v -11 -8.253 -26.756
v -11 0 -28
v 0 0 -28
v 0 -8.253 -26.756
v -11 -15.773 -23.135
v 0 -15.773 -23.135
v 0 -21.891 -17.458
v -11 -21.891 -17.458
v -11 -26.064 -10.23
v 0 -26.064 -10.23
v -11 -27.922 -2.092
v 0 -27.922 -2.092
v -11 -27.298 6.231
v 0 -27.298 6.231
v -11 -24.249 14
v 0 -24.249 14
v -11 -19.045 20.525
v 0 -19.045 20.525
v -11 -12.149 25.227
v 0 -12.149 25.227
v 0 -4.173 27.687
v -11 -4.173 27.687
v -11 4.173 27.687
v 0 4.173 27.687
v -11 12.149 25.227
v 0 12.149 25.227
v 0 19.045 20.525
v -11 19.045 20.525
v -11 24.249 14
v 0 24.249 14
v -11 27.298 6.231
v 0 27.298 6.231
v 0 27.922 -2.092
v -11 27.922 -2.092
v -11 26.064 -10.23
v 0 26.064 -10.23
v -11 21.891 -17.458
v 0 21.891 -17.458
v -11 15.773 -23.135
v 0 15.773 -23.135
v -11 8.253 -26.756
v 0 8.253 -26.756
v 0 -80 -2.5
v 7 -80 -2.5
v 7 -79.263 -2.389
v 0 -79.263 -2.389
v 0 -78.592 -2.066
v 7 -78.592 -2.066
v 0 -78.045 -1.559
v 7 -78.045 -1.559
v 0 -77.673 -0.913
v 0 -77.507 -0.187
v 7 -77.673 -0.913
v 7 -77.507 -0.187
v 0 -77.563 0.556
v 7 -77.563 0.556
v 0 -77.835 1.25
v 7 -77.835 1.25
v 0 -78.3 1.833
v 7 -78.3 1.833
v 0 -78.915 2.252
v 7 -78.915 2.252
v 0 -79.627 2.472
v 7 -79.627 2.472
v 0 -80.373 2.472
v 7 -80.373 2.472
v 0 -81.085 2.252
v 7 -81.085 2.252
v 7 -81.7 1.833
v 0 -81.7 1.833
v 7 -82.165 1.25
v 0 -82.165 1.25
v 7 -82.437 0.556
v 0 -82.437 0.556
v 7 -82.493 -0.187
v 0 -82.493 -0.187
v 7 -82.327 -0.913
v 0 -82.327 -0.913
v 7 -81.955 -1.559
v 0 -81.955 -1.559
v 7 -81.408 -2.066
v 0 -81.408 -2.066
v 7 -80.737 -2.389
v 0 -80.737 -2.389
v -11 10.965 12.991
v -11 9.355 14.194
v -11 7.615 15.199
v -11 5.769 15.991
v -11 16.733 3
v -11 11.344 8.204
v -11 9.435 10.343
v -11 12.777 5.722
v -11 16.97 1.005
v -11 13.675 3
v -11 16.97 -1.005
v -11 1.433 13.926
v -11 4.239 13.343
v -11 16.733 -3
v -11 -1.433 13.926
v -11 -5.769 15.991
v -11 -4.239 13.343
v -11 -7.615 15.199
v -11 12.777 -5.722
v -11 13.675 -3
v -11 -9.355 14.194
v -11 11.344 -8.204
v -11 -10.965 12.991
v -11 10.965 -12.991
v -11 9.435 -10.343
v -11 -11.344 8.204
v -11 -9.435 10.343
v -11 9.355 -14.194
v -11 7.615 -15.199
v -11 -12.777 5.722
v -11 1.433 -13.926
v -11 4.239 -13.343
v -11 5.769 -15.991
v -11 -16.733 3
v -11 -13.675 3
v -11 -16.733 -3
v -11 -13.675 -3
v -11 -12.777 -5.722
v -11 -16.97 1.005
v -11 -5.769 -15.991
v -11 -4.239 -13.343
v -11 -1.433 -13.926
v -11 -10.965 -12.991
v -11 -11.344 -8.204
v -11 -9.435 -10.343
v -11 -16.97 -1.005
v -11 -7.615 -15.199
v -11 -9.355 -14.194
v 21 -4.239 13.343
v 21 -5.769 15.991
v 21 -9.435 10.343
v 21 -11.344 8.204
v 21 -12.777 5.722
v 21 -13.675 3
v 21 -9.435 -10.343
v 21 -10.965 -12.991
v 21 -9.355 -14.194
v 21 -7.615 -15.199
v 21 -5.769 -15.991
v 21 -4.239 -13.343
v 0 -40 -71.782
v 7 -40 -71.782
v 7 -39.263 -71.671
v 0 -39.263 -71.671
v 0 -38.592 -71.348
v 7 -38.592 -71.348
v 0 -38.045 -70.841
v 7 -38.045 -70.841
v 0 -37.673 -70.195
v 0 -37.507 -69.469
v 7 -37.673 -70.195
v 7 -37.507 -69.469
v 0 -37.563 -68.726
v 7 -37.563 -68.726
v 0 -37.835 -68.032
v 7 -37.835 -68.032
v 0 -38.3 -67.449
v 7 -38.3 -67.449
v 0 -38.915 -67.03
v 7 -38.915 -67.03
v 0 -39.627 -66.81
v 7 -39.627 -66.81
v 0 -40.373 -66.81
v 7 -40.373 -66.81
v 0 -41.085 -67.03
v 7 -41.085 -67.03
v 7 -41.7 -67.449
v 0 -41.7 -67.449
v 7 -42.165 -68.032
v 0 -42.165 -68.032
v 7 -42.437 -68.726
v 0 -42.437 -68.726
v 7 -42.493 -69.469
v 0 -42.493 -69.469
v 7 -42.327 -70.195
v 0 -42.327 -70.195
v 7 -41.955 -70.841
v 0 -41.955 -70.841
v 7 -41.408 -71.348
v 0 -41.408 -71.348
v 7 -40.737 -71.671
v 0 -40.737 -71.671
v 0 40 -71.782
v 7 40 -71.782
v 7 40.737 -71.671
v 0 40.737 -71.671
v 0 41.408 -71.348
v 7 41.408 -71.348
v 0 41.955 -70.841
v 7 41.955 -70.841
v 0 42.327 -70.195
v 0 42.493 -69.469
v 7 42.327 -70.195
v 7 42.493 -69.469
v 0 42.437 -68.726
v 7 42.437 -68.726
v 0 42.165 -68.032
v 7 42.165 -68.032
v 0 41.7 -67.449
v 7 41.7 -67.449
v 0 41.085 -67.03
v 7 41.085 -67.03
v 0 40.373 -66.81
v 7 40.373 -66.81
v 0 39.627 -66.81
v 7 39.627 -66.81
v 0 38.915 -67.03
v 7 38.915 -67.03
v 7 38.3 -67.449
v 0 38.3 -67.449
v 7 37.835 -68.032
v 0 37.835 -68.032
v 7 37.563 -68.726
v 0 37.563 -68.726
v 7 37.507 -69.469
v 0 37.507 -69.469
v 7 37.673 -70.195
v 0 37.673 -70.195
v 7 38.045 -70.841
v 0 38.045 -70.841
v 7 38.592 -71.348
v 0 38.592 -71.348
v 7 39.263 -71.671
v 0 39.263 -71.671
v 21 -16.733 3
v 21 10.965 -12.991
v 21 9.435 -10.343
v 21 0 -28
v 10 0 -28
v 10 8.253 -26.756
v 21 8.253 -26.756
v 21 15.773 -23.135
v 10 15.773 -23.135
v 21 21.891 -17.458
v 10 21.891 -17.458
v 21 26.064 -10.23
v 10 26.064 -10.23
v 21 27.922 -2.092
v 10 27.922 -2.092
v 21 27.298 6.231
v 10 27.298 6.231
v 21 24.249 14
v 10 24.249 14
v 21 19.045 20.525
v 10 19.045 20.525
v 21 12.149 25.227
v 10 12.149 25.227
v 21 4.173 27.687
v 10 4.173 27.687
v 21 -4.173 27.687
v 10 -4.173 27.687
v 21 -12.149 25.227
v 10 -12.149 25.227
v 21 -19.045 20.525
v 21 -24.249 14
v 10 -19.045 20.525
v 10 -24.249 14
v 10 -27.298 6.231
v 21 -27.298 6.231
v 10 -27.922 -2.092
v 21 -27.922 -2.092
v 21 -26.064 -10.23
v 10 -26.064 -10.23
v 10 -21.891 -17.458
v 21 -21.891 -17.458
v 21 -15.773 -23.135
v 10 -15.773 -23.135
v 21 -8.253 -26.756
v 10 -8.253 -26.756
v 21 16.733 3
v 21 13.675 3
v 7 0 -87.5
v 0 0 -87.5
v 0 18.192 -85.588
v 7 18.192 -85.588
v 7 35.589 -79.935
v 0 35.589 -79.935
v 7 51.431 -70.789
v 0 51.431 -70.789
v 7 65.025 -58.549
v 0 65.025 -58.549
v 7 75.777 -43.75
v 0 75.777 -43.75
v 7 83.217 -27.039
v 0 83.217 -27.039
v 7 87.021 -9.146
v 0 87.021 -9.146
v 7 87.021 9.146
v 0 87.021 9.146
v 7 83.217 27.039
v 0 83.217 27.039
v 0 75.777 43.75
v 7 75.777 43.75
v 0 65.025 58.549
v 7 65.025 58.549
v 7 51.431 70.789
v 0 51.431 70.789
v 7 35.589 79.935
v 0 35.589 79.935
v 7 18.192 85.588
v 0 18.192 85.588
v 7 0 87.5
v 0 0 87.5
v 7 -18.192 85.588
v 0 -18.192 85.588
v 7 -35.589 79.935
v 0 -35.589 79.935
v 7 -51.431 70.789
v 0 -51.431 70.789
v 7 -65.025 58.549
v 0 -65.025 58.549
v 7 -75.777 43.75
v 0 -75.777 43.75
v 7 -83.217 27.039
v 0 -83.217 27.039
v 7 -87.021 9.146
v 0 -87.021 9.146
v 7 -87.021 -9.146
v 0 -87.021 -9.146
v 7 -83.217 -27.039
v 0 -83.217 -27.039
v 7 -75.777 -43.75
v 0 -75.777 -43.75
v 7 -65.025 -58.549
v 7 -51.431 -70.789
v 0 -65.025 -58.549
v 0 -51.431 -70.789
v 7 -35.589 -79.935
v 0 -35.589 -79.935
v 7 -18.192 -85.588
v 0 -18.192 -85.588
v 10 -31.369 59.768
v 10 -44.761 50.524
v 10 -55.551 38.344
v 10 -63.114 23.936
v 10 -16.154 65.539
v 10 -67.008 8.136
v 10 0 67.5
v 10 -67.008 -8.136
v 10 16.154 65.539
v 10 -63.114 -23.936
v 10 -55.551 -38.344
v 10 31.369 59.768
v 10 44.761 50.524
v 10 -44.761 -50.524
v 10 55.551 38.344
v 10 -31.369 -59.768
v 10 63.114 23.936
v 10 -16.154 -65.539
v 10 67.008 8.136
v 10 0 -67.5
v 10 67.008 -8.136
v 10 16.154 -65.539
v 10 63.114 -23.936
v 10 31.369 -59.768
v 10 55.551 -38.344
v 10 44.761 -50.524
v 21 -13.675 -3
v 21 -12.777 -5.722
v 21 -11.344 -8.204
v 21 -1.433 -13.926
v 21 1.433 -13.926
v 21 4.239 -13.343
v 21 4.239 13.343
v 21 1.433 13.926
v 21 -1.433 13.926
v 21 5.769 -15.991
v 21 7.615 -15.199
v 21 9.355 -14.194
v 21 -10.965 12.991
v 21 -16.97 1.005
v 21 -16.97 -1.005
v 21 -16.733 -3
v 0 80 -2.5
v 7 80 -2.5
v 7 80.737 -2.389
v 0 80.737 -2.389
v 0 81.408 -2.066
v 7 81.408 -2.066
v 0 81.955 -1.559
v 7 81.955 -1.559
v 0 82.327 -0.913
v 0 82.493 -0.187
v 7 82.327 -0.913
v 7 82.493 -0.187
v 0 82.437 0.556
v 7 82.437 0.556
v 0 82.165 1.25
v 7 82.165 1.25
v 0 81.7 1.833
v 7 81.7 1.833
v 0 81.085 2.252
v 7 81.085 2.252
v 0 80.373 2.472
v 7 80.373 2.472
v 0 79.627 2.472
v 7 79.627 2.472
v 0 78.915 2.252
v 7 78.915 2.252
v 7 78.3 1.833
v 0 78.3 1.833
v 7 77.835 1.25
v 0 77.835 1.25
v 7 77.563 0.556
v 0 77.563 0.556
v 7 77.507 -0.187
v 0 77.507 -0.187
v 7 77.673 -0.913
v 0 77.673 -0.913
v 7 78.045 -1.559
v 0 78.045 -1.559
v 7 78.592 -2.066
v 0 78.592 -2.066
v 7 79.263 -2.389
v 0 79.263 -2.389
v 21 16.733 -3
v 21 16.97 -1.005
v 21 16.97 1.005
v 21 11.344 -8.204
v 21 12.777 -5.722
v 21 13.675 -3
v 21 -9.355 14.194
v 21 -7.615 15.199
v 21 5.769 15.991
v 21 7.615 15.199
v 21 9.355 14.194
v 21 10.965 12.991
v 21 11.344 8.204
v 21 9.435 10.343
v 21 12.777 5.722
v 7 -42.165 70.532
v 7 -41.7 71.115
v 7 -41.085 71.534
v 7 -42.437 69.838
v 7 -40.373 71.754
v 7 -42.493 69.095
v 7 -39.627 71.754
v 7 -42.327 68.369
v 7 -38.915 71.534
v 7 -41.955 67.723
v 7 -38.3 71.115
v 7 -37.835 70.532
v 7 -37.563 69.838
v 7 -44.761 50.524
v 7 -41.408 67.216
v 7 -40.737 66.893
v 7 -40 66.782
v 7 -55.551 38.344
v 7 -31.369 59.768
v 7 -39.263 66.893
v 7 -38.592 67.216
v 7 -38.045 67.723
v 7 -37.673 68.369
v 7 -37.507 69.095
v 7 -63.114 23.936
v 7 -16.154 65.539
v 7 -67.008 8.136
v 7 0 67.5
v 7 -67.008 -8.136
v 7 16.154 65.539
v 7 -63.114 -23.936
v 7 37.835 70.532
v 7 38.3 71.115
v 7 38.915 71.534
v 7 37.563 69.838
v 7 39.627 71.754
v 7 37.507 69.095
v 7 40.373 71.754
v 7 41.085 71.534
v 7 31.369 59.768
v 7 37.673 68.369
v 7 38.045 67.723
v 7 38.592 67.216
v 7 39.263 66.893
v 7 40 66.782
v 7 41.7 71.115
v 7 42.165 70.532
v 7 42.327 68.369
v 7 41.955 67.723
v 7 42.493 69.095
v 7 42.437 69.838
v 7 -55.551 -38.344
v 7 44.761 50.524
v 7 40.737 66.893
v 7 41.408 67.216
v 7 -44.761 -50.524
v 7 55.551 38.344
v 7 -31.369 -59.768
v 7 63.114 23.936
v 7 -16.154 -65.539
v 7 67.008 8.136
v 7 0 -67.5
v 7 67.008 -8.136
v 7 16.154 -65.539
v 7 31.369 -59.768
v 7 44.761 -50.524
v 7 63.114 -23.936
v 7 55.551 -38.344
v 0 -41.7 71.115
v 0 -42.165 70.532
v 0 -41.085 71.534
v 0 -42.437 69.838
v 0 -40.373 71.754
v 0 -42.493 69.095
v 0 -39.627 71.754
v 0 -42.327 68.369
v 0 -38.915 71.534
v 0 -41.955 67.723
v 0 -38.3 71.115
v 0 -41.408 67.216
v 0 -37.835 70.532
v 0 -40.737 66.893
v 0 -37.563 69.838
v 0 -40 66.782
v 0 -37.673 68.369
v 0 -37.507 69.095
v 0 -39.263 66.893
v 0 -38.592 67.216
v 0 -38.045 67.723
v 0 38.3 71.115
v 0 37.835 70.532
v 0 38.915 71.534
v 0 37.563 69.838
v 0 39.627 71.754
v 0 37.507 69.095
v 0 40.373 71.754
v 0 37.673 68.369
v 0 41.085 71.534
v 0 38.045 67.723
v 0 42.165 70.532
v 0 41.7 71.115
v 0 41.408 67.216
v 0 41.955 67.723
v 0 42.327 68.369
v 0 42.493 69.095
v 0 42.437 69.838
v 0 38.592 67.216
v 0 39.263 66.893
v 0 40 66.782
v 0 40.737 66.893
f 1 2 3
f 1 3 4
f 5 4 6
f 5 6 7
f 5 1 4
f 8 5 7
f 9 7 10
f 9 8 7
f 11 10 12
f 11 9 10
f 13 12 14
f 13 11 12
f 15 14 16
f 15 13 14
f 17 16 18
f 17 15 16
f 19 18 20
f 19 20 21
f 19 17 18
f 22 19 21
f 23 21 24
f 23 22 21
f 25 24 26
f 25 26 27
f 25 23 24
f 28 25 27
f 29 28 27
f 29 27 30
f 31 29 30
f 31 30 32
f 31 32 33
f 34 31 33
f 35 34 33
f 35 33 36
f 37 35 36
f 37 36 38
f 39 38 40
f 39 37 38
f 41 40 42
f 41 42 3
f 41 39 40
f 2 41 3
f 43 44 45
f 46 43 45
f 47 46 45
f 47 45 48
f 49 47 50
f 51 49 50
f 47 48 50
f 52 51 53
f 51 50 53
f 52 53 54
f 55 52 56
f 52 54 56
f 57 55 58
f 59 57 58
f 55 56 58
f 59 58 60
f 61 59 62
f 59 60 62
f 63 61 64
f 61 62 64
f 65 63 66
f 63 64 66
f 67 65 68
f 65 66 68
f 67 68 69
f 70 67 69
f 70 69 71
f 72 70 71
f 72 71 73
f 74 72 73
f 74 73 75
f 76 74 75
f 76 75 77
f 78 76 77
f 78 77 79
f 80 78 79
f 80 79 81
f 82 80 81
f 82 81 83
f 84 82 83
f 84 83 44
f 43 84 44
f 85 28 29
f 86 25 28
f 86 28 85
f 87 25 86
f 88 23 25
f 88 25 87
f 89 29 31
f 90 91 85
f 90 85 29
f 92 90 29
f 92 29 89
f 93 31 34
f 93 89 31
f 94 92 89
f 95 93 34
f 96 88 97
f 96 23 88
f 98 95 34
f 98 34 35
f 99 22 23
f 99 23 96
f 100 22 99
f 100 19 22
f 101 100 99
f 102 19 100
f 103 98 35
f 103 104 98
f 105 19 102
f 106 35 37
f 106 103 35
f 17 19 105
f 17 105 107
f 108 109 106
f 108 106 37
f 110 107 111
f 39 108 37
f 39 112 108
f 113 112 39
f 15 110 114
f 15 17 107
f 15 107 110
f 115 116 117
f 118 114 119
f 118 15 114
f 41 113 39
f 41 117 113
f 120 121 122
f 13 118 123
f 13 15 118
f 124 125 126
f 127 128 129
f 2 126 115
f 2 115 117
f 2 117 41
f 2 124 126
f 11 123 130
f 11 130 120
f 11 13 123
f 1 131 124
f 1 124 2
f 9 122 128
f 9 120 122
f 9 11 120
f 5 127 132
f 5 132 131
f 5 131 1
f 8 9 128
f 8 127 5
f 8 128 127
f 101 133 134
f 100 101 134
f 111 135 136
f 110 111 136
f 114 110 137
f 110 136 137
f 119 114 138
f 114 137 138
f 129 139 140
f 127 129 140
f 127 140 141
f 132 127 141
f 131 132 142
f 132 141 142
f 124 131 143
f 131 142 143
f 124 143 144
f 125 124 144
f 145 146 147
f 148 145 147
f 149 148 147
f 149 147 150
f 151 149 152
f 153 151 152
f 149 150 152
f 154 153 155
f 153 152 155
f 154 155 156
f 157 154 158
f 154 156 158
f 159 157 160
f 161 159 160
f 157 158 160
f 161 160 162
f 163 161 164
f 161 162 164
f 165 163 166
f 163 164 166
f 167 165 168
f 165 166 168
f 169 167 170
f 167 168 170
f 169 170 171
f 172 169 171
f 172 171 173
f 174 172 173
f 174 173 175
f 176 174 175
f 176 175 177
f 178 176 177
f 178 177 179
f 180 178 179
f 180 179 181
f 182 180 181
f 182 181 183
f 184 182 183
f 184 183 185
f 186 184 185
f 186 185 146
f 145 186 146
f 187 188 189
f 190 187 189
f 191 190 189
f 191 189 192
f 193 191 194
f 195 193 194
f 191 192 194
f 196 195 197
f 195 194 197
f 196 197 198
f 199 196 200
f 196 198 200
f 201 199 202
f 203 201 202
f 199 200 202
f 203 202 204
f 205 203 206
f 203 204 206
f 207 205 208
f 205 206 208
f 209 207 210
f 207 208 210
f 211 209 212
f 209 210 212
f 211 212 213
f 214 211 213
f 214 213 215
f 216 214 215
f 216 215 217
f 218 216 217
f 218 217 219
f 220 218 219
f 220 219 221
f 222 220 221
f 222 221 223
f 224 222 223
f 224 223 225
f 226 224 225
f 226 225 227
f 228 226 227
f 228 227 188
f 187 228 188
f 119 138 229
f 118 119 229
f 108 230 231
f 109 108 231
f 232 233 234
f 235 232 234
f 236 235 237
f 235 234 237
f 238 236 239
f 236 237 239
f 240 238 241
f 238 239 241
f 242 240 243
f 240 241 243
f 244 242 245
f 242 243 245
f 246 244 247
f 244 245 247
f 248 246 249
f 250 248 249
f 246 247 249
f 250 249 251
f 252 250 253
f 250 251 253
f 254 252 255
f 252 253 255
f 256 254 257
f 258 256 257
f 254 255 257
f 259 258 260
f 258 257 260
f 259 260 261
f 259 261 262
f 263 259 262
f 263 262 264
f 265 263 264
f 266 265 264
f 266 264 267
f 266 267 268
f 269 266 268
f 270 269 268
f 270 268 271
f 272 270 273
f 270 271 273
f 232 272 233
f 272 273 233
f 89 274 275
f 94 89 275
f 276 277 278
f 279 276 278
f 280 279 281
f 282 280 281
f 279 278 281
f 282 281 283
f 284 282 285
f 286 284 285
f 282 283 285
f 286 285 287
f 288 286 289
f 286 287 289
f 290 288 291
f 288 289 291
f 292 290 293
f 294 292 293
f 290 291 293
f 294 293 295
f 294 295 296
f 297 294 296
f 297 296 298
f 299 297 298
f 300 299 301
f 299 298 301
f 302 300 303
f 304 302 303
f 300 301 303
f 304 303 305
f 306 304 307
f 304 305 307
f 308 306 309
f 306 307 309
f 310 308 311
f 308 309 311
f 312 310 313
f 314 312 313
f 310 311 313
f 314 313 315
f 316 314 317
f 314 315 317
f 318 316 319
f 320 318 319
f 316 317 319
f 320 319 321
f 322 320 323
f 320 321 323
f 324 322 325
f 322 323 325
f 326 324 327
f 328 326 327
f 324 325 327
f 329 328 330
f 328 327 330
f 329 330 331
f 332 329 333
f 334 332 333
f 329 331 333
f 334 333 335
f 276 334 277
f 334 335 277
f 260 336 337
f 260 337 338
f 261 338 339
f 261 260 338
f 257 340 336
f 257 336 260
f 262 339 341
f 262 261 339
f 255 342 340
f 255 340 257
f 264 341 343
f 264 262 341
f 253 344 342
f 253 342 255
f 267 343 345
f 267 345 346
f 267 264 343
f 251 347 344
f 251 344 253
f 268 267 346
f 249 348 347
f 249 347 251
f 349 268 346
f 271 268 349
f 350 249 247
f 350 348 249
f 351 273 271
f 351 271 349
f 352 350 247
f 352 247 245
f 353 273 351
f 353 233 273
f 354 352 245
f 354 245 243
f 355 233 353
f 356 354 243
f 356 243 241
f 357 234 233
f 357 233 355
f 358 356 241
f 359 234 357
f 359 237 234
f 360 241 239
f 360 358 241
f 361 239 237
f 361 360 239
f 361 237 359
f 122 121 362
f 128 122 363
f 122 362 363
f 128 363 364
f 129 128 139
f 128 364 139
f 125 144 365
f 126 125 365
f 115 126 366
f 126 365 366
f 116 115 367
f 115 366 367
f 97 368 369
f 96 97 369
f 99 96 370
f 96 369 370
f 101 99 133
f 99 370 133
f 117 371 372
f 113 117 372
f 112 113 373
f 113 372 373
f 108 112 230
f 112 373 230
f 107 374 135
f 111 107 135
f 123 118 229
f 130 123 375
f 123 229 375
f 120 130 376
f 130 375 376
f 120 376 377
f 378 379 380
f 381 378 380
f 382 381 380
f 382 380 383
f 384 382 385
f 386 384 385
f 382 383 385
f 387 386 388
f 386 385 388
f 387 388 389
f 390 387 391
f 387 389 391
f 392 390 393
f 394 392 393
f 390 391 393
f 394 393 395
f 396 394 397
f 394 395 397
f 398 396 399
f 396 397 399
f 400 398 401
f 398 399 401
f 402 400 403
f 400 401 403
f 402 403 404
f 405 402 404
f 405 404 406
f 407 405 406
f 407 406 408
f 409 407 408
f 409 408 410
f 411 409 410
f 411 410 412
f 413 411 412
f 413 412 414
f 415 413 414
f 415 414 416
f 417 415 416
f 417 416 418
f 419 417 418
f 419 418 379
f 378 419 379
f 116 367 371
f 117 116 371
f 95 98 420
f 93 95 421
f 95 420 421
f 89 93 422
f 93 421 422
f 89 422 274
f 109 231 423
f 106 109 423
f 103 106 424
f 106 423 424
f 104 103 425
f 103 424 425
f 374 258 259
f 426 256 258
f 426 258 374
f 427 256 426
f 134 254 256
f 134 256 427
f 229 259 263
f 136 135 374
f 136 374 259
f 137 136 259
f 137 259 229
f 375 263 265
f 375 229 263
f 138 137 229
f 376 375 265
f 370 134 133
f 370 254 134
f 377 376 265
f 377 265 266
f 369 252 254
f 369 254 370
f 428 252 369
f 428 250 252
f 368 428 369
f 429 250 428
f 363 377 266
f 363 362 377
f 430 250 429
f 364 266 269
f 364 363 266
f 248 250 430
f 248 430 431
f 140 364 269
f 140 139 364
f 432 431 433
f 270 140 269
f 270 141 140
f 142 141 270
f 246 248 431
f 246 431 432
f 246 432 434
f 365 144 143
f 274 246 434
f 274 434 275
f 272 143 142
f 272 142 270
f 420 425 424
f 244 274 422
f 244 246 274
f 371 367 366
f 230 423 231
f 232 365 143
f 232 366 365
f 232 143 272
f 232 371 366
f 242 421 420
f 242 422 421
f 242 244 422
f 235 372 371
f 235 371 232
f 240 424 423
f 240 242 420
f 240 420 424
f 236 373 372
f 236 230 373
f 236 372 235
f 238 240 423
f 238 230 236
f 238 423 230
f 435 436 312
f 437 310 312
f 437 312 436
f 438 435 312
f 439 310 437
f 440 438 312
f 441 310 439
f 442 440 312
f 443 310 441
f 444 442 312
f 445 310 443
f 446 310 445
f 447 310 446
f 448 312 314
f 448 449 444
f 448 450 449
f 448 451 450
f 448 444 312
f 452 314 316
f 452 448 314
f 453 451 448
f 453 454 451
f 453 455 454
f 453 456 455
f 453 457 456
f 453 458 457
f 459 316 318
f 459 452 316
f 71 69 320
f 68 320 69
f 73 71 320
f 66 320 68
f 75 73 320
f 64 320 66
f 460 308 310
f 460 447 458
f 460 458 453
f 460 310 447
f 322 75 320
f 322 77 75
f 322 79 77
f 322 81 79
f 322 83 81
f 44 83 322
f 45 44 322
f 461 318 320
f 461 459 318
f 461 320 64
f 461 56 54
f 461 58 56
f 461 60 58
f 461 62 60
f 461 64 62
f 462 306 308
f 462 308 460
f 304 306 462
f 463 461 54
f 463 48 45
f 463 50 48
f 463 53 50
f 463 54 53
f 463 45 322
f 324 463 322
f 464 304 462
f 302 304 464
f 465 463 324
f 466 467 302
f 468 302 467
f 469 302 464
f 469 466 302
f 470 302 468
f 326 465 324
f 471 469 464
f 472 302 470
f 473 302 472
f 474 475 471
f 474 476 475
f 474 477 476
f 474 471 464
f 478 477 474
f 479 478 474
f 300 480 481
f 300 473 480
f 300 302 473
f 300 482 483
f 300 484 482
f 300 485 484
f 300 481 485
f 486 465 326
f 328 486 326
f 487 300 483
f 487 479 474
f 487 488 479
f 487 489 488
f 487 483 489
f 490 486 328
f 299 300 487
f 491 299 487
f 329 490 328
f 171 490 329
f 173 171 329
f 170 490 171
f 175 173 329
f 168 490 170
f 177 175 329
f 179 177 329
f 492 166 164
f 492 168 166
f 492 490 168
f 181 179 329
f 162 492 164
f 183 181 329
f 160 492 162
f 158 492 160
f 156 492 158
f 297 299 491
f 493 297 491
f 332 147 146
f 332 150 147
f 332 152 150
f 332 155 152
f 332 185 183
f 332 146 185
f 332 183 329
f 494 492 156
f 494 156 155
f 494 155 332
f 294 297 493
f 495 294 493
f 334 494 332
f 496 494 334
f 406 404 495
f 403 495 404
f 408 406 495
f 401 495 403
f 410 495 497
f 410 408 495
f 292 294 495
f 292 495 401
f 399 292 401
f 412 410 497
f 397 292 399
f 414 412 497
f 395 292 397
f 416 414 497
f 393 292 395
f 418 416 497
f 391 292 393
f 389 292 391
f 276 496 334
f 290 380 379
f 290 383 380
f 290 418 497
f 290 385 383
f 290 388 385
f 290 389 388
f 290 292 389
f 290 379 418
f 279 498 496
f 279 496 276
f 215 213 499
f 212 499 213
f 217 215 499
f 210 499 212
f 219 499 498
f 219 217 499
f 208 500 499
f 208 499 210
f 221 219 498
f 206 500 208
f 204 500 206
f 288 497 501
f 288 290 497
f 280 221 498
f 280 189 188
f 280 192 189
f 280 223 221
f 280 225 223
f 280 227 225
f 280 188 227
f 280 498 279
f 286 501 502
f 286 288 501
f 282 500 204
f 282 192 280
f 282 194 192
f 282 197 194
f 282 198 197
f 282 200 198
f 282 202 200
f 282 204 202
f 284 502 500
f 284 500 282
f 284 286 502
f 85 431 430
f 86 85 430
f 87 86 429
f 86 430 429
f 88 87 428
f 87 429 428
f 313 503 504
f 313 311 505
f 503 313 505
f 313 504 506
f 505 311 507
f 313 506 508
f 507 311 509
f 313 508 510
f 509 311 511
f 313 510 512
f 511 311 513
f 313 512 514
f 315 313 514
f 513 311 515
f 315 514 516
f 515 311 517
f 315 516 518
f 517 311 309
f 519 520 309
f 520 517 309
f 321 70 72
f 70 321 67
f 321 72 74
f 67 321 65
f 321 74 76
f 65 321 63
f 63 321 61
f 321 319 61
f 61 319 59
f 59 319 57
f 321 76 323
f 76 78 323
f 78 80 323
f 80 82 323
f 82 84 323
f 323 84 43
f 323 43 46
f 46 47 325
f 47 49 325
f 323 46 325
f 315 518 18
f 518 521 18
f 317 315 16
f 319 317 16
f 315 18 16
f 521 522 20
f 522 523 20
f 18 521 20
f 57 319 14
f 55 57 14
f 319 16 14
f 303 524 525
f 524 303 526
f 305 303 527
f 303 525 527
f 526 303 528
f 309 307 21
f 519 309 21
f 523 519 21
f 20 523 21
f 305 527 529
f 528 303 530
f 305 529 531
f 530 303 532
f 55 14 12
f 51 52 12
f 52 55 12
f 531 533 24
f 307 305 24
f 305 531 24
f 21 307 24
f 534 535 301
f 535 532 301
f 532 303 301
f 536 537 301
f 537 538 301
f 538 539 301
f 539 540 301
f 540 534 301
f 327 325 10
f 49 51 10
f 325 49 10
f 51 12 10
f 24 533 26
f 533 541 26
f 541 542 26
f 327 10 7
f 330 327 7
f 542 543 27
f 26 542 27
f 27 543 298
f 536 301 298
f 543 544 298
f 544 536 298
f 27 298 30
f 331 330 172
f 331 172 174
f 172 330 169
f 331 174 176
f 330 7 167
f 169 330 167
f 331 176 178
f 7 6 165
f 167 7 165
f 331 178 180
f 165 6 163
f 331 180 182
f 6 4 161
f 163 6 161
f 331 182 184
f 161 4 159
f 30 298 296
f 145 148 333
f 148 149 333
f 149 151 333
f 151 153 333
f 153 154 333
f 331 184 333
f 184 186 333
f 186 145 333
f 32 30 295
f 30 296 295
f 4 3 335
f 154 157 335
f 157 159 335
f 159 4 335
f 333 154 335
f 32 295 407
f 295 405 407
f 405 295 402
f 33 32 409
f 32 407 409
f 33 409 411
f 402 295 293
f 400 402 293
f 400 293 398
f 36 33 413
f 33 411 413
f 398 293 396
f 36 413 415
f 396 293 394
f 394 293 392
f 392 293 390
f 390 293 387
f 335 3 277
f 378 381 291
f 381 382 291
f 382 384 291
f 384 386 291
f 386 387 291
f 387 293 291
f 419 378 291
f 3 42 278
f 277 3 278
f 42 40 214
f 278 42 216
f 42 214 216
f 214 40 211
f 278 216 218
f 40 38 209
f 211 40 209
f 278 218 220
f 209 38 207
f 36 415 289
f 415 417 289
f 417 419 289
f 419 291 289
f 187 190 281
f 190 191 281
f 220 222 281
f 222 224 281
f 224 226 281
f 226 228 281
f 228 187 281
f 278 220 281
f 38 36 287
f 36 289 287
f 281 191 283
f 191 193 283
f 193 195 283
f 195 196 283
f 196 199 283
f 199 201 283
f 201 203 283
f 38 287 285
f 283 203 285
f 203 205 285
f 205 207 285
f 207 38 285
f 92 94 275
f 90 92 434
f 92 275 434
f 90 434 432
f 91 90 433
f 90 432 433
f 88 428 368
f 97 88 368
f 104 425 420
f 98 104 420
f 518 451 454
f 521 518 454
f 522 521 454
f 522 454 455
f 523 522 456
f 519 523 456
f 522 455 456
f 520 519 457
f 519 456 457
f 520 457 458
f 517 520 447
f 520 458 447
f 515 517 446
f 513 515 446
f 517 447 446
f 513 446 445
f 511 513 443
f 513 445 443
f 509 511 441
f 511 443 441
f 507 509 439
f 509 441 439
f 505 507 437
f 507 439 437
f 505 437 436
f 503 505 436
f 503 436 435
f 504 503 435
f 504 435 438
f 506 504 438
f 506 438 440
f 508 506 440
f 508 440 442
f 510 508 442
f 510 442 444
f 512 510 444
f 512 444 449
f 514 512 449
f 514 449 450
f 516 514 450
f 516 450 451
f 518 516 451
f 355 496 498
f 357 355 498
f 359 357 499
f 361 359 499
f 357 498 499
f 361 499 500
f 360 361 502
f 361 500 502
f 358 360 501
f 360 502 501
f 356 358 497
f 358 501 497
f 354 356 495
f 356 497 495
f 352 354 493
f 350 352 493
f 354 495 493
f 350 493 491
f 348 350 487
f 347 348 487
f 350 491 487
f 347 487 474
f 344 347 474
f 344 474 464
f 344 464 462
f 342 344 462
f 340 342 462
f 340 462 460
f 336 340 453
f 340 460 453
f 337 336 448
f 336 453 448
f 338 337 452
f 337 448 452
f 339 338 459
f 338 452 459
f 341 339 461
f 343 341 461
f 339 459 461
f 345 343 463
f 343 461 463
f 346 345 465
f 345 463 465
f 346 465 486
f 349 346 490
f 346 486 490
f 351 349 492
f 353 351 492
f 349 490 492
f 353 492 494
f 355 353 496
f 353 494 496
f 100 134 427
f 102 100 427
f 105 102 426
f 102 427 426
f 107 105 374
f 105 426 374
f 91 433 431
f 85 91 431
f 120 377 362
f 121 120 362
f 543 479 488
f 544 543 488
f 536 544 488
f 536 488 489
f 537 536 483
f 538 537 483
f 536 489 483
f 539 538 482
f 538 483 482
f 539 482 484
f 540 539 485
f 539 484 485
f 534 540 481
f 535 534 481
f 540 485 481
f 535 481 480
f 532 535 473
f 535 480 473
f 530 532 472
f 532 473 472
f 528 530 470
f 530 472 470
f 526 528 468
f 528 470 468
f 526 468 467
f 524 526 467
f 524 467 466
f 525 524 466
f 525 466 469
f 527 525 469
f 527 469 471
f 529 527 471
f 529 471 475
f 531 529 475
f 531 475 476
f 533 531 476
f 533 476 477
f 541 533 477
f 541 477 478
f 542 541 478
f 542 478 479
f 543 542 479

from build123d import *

# Parameters (mm, degrees)
SKETCH1_R           = 87.5
BOSS_EXTRUDE1_DEPTH = 7
SKETCH2_R           = 67.5
BOSS_EXTRUDE2_DEPTH = 3
SKETCH3_R           = 2.5
CUT_EXTRUDE1_DEPTH  = 124.941518467
SKETCH4_R           = 28
BOSS_EXTRUDE3_DEPTH = 11
BOSS_EXTRUDE4_START = 11
SKETCH6_R           = 28
BOSS_EXTRUDE4_DEPTH = 11
CUT_EXTRUDE2_DEPTH  = 128.814318447


with BuildPart() as part:
    # Sketch1 → Boss-Extrude1 (new body)
    with BuildSketch(Plane(origin=(0, 0, 0), x_dir=(0, 0, -1), z_dir=(1, 0, 0))):
        Circle(SKETCH1_R)
    extrude(amount=BOSS_EXTRUDE1_DEPTH)

    # Sketch2 → Boss-Extrude2 (add)
    with BuildSketch(Plane(origin=(7, 0, 0), x_dir=(0, 0, -1), z_dir=(1, 0, 0))):
        Circle(SKETCH2_R)
    extrude(amount=BOSS_EXTRUDE2_DEPTH)

    # Sketch3 → Cut-Extrude1 (cut, through all)
    with BuildSketch(Plane(origin=(7, 0, 0), x_dir=(0, 0, -1), z_dir=(1, 0, 0))):
        with Locations((0, -80)):
            Circle(SKETCH3_R)
        with Locations((-69.282032303, -40)):
            Circle(SKETCH3_R)
        with Locations((-69.282032303, 40)):
            Circle(SKETCH3_R)
        with Locations((0, 80)):
            Circle(SKETCH3_R)
        with Locations((69.282032303, 40)):
            Circle(SKETCH3_R)
        with Locations((69.282032303, -40)):
            Circle(SKETCH3_R)
    extrude(amount=-CUT_EXTRUDE1_DEPTH, mode=Mode.SUBTRACT)

    # Sketch4 → Boss-Extrude3 (add)
    with BuildSketch(Plane(origin=(10, 0, 0), x_dir=(0, 0, -1), z_dir=(1, 0, 0))):
        Circle(SKETCH4_R)
    extrude(amount=BOSS_EXTRUDE3_DEPTH)

    # Sketch6 → Boss-Extrude4 (add)
    with BuildSketch(Plane.ZY.offset(BOSS_EXTRUDE4_START)):
        with Locations(Location((0, 0, 0), (0, 0, 180))):
            Circle(SKETCH6_R)
    extrude(amount=-BOSS_EXTRUDE4_DEPTH)

    # Sketch8 → Cut-Extrude2 (cut, through all)
    with BuildSketch(Plane(origin=(21, 0, 0), x_dir=(0, 0, -1), z_dir=(1, 0, 0))):
        with BuildLine():
            Line((-3, 16.733200531), (-3, 13.674794331))
            ThreePointArc((-3, 13.674794331), (-7, 12.124355653), (-10.342719282, 9.435473377))
            Line((-10.342719282, 9.435473377), (-12.991376746, 10.964676477))
            ThreePointArc((-12.991376746, 10.964676477), (-14.722431864, 8.5), (-15.991376746, 5.768524054))
            Line((-15.991376746, 5.768524054), (-13.342719282, 4.239320954))
            ThreePointArc((-13.342719282, 4.239320954), (-14, 0), (-13.342719282, -4.239320954))
            Line((-13.342719282, -4.239320954), (-15.991376746, -5.768524054))
            ThreePointArc((-15.991376746, -5.768524054), (-14.722431864, -8.5), (-12.991376746, -10.964676477))
            Line((-12.991376746, -10.964676477), (-10.342719282, -9.435473377))
            ThreePointArc((-10.342719282, -9.435473377), (-7, -12.124355653), (-3, -13.674794331))
            Line((-3, -13.674794331), (-3, -16.733200531))
            ThreePointArc((-3, -16.733200531), (0, -17), (3, -16.733200531))
            Line((3, -16.733200531), (3, -13.674794331))
            ThreePointArc((3, -13.674794331), (7, -12.124355653), (10.342719282, -9.435473377))
            Line((10.342719282, -9.435473377), (12.991376746, -10.964676477))
            ThreePointArc((12.991376746, -10.964676477), (14.722431864, -8.5), (15.991376746, -5.768524054))
            Line((15.991376746, -5.768524054), (13.342719282, -4.239320954))
            ThreePointArc((13.342719282, -4.239320954), (14, 0), (13.342719282, 4.239320954))
            Line((13.342719282, 4.239320954), (15.991376746, 5.768524054))
            ThreePointArc((15.991376746, 5.768524054), (14.722431864, 8.5), (12.991376746, 10.964676477))
            Line((12.991376746, 10.964676477), (10.342719282, 9.435473377))
            ThreePointArc((10.342719282, 9.435473377), (7, 12.124355653), (3, 13.674794331))
            Line((3, 13.674794331), (3, 16.733200531))
            ThreePointArc((3, 16.733200531), (0, 17), (-3, 16.733200531))
        make_face()
    extrude(amount=-CUT_EXTRUDE2_DEPTH, mode=Mode.SUBTRACT)


solid = part.part
